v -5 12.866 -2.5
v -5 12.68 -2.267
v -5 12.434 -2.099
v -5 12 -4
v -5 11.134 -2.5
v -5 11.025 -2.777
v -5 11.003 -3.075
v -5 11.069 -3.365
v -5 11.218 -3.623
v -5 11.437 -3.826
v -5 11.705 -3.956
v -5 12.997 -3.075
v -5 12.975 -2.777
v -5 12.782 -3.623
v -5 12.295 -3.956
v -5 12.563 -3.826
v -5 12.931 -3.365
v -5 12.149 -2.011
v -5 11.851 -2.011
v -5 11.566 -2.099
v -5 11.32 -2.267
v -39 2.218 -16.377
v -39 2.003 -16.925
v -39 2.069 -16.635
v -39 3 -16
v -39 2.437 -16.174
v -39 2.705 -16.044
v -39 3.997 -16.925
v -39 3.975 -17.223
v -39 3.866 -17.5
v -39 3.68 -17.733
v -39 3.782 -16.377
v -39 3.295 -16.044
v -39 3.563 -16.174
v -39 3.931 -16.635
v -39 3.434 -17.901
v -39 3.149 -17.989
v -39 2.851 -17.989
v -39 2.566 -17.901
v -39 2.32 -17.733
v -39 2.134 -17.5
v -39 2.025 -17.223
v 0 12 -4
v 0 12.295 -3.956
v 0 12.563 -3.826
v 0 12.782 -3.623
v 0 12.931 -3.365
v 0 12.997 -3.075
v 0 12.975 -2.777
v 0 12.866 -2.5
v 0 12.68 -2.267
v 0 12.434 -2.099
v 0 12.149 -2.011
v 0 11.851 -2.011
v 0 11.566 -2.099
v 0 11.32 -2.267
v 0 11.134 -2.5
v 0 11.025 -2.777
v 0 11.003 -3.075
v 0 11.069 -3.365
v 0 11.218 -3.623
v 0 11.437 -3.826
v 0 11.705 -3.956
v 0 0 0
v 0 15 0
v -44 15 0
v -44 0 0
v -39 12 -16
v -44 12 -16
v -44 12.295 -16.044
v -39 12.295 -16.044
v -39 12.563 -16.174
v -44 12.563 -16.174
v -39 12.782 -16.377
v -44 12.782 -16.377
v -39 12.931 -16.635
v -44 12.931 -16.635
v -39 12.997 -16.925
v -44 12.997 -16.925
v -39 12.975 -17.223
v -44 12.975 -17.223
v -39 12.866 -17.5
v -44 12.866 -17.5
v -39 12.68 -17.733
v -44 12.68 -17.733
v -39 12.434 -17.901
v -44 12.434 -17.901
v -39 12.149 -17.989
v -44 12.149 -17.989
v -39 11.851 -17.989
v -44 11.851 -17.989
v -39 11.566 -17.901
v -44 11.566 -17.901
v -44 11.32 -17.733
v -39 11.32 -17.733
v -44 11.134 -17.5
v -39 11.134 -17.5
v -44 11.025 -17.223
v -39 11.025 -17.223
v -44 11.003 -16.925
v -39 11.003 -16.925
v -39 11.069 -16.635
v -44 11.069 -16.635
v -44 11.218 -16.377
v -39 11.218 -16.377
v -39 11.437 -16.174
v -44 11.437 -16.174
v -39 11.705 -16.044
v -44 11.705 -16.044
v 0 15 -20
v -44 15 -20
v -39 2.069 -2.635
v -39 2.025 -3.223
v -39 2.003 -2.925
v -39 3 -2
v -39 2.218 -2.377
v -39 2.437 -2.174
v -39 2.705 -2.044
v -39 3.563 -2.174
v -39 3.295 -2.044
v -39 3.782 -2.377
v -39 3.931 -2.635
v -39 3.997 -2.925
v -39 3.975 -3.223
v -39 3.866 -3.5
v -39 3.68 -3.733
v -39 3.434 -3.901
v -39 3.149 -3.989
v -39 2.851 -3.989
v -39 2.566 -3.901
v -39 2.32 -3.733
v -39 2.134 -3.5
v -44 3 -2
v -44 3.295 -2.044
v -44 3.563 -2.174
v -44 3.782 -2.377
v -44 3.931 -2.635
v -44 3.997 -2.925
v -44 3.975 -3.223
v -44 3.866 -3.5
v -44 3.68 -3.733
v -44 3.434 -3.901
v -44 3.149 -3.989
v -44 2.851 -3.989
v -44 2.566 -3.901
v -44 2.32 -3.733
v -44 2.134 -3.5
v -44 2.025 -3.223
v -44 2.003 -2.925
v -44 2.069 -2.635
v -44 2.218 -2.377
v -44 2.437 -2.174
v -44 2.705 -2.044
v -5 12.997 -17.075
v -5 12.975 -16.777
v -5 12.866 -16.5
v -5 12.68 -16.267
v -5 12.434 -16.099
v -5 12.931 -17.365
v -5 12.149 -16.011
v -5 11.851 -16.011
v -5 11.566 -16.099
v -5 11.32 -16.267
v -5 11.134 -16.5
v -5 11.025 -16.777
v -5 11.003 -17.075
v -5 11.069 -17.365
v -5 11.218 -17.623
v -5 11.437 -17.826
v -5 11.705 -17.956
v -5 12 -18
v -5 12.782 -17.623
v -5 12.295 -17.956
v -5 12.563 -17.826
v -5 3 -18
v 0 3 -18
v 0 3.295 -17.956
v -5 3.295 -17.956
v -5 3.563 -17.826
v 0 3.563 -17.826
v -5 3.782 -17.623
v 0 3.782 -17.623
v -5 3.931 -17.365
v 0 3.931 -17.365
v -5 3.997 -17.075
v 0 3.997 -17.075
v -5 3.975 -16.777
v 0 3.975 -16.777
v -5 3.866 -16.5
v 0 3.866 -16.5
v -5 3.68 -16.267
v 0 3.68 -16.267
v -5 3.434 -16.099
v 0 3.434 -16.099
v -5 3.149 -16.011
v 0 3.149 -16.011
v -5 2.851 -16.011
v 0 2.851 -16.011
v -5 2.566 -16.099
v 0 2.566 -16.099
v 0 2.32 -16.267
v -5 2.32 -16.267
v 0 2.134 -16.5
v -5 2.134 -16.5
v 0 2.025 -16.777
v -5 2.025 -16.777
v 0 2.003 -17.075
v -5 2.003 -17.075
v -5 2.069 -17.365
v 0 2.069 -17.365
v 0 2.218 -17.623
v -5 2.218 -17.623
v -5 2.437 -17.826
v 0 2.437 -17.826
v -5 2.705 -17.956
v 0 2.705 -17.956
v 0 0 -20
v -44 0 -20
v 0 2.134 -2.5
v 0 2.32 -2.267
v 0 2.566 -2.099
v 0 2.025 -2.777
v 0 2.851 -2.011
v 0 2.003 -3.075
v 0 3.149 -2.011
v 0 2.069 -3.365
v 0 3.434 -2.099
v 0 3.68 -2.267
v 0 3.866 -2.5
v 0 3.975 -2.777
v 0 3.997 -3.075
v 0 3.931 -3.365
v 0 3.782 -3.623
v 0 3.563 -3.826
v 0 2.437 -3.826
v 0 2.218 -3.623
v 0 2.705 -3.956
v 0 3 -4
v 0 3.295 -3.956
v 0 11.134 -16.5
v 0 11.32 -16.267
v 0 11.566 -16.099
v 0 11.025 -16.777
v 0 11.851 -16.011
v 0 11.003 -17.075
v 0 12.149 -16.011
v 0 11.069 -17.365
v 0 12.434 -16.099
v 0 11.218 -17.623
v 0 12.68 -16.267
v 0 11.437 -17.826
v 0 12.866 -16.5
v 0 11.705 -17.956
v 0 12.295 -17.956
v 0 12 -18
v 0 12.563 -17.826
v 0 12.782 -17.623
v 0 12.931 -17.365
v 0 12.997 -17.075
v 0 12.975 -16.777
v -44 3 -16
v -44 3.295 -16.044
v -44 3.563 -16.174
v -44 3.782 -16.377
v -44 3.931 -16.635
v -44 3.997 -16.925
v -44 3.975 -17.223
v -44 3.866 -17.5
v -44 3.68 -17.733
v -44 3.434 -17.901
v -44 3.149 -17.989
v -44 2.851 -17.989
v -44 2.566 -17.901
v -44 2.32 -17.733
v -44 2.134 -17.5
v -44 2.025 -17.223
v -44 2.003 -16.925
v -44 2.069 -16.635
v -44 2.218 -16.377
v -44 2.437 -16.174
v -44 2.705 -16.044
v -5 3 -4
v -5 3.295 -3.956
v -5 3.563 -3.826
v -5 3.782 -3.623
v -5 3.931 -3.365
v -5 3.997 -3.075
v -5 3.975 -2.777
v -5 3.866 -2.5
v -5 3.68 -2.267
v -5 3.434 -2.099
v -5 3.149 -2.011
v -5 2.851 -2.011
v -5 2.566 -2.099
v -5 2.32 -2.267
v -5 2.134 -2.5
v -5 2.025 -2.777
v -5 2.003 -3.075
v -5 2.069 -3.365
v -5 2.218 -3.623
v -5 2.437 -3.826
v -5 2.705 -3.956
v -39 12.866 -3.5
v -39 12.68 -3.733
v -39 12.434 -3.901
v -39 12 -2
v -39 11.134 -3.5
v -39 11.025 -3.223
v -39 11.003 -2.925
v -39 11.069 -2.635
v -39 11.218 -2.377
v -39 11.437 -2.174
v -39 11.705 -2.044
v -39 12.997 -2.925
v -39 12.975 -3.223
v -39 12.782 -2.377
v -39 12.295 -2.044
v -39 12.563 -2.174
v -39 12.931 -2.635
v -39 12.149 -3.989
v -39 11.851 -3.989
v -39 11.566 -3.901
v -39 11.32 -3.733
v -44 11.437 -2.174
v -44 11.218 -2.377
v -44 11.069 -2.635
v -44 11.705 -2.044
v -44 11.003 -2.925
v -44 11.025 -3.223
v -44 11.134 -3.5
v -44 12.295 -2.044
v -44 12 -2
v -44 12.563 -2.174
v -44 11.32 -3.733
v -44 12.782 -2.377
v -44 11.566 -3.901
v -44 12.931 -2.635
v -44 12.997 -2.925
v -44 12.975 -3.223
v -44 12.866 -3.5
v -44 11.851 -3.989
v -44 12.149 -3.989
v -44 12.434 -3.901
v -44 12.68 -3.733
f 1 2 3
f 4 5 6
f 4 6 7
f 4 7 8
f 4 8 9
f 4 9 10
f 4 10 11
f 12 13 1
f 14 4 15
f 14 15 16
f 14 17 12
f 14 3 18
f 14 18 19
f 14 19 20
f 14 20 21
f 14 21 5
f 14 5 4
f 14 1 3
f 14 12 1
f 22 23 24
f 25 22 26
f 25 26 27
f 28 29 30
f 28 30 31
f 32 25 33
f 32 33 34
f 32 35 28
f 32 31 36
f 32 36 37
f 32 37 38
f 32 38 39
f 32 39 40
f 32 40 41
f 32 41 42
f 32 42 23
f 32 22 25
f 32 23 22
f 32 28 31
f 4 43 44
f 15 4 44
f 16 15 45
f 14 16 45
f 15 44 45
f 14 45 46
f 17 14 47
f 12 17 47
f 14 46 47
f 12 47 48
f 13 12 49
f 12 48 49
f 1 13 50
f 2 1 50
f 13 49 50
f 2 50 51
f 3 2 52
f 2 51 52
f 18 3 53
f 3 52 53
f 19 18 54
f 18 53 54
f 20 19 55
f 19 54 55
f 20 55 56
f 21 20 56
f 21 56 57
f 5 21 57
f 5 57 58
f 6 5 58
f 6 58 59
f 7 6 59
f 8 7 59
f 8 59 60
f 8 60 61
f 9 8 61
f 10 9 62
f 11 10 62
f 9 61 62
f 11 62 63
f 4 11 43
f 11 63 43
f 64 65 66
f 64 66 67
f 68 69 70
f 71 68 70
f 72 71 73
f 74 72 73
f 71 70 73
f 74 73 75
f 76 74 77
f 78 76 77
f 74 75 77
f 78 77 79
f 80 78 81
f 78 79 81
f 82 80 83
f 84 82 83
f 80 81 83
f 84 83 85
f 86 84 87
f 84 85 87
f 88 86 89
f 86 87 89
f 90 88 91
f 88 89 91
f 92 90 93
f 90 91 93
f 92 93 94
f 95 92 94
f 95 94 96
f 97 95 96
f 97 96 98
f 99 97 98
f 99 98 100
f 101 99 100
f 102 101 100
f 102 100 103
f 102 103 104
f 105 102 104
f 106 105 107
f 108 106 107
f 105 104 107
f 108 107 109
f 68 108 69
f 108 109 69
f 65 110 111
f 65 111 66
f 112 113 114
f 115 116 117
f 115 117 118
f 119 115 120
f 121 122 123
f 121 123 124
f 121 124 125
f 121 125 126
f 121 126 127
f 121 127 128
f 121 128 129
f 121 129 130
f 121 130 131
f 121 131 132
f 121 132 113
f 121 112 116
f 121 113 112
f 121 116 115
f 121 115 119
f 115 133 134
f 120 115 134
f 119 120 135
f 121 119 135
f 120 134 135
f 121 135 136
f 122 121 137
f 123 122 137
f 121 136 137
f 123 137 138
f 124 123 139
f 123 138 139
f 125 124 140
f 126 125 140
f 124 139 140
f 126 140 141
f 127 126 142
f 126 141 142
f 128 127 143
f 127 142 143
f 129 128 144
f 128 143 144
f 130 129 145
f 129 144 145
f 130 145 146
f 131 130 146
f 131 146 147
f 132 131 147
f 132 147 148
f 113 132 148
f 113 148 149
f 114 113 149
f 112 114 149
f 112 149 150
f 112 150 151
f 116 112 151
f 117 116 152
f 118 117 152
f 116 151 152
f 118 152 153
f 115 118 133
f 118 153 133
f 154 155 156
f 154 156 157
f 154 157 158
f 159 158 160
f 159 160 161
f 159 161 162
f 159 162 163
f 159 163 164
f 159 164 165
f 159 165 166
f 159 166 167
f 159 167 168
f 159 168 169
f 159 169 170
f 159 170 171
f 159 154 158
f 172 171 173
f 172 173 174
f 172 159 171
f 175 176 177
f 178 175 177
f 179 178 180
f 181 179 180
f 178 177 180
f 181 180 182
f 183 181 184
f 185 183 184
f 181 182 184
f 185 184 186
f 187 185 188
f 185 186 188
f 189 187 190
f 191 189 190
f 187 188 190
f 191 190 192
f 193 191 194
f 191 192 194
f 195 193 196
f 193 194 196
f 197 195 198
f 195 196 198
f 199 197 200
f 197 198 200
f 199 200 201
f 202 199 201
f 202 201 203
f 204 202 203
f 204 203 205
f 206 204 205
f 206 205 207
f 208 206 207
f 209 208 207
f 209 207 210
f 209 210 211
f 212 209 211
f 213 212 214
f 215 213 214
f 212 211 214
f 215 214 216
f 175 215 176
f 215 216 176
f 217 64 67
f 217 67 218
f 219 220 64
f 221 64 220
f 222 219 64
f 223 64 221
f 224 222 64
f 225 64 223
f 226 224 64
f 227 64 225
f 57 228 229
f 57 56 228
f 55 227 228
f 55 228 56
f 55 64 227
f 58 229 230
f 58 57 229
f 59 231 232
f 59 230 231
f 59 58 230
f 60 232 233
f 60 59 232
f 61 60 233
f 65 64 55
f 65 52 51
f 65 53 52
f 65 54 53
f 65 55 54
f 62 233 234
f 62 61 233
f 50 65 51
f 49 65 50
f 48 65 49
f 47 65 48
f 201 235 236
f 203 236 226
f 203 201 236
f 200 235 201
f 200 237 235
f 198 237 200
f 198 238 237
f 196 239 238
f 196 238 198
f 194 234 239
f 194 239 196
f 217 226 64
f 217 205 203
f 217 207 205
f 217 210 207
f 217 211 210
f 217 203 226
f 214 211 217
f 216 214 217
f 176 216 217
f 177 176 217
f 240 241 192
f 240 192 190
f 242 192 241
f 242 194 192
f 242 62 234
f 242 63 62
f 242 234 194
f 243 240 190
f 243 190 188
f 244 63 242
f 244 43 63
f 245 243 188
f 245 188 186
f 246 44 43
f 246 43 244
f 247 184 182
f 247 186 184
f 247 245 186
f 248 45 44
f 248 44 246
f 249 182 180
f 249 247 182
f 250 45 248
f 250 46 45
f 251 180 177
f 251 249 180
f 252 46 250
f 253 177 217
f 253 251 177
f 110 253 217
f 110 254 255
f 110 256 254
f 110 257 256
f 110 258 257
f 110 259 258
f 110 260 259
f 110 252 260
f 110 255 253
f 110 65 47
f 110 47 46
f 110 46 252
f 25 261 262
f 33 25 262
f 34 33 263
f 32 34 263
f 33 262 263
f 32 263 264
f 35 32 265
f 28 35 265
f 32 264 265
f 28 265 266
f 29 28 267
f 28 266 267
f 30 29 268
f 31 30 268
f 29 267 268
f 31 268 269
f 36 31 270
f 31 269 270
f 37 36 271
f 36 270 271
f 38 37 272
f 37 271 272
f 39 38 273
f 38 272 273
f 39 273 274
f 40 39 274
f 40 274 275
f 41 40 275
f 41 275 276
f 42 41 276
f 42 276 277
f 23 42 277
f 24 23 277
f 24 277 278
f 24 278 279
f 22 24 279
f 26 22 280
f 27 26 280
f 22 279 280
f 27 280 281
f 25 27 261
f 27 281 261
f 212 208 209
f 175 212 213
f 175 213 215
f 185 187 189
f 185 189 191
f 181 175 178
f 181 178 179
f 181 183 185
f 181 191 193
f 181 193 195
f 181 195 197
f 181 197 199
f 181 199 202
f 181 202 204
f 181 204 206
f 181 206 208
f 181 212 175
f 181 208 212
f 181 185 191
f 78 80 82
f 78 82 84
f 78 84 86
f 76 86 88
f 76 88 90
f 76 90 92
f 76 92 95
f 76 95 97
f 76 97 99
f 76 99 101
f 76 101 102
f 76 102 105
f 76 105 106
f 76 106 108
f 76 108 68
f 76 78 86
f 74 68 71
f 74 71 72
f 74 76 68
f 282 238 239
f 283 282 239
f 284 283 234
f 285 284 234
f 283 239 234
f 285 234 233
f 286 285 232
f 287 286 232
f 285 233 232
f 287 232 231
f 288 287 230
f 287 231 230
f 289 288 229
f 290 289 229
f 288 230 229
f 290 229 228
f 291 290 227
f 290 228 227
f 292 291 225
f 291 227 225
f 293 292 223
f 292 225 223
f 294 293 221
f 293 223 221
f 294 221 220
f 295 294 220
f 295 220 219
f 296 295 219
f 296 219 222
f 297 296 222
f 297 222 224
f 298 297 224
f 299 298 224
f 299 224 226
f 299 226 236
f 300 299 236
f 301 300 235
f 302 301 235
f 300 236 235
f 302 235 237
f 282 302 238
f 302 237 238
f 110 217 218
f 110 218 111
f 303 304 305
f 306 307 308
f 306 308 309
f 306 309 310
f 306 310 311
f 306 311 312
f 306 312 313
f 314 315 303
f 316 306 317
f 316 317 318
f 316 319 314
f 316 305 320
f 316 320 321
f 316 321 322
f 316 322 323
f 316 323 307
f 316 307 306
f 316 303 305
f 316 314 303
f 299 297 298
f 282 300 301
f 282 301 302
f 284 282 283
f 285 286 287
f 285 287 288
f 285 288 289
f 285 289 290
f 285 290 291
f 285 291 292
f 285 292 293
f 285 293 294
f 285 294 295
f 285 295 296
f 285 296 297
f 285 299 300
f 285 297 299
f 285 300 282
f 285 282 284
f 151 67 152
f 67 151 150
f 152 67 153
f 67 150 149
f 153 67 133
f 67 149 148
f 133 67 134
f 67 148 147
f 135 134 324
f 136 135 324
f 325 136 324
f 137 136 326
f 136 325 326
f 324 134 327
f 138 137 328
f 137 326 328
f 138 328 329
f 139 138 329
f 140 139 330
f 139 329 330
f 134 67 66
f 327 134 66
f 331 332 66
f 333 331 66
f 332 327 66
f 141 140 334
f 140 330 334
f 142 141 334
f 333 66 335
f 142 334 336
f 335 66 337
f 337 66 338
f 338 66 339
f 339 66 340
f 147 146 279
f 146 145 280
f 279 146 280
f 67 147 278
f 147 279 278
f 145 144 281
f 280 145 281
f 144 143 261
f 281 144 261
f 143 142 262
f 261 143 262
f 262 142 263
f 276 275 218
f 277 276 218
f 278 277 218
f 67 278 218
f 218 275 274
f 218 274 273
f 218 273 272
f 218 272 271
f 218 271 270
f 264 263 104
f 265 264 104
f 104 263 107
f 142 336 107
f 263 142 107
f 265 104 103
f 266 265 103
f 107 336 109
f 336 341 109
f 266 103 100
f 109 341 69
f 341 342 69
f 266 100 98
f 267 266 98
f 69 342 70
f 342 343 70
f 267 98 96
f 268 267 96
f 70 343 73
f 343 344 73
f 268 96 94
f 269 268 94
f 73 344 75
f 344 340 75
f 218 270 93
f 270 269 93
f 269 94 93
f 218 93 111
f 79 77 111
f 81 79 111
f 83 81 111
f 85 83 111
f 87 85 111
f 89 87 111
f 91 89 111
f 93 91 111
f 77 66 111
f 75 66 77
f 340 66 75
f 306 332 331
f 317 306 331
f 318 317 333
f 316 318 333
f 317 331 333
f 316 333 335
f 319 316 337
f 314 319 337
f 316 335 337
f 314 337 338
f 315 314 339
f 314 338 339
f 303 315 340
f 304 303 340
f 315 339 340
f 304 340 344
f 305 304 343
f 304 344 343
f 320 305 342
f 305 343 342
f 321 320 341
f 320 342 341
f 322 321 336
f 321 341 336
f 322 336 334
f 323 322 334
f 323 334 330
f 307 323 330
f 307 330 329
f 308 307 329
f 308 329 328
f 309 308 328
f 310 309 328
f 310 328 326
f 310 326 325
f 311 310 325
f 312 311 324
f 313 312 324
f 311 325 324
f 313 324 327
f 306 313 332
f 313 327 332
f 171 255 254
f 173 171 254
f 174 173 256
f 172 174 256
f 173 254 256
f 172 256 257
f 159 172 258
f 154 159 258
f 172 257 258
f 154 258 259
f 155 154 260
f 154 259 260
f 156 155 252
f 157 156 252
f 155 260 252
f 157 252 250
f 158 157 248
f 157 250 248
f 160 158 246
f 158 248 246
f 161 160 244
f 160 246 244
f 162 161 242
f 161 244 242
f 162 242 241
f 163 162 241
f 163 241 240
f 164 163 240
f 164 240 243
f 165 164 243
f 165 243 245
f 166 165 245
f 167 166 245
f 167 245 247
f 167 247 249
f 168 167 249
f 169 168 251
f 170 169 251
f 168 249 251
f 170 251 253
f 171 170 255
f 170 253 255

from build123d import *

# Parameters (mm, degrees)
SKETCH1_W           = 20
SKETCH1_H           = 15
BOSS_EXTRUDE1_DEPTH = 44
SKETCH1_3_R         = 1
CUT_EXTRUDE1_DEPTH  = 5
CUT_EXTRUDE2_START  = -5
SKETCH2_R           = 1
CUT_EXTRUDE2_DEPTH  = 5


with BuildPart() as part:
    # Sketch1 → Boss-Extrude1 (new body)
    with BuildSketch(Plane(origin=(0, 0, 0), x_dir=(0, 0, -1), z_dir=(1, 0, 0))):
        with Locations((10, 7.5)):
            Rectangle(SKETCH1_W, SKETCH1_H)
    extrude(amount=-BOSS_EXTRUDE1_DEPTH)

    # Sketch1<3> → Cut-Extrude1 (cut)
    with BuildSketch(Plane(origin=(0, 0, 0), x_dir=(0, 0, -1), z_dir=(1, 0, 0))):
        with Locations((3, 12)):
            Circle(SKETCH1_3_R)
        with Locations((17, 12)):
            Circle(SKETCH1_3_R)
        with Locations((17, 3)):
            Circle(SKETCH1_3_R)
        with Locations((3, 3)):
            Circle(SKETCH1_3_R)
    extrude(amount=-CUT_EXTRUDE1_DEPTH, mode=Mode.SUBTRACT)

    # Sketch2 → Cut-Extrude2 (cut)
    with BuildSketch(Plane.ZY.offset(44).offset(CUT_EXTRUDE2_START)):
        with Locations((-17, 12)):
            Circle(SKETCH2_R)
        with Locations((-3, 12)):
            Circle(SKETCH2_R)
        with Locations((-3, 3)):
            Circle(SKETCH2_R)
        with Locations((-17, 3)):
            Circle(SKETCH2_R)
    extrude(amount=CUT_EXTRUDE2_DEPTH, mode=Mode.SUBTRACT)


solid = part.part
